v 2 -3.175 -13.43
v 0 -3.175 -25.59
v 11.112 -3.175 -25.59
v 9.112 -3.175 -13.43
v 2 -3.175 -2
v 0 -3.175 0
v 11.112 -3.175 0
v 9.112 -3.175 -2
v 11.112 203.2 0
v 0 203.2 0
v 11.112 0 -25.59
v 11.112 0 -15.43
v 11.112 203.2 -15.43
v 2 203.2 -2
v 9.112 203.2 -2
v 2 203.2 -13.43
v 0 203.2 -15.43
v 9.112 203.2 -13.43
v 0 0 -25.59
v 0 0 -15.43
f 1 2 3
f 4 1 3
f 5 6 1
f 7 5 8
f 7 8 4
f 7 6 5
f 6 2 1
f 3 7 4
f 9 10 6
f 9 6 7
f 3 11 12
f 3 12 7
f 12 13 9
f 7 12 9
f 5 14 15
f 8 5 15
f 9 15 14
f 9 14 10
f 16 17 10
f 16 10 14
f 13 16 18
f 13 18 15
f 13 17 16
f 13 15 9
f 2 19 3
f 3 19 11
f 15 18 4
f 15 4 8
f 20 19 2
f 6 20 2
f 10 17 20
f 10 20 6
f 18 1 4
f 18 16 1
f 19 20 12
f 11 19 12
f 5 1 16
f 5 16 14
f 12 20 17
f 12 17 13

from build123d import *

# Parameters (mm, degrees)
SKETCH1_W           = 11.112
SKETCH1_H           = 15.43
SKETCH1_W_2         = 7.112
SKETCH1_H_2         = 11.43
BOSS_EXTRUDE1_DEPTH = 203.2
SKETCH2_W           = 11.112
SKETCH2_H           = 25.59
SKETCH2_W_2         = 7.112
SKETCH2_H_2         = 11.43
BOSS_EXTRUDE2_DEPTH = 3.175


with BuildPart() as part:
    # Sketch1 → Boss-Extrude1 (new body)
    with BuildSketch(Plane(origin=(0, 0, 0), x_dir=(1, 0, 0), z_dir=(0, 1, 0))):
        with Locations((5.556, 7.715)):
            Rectangle(SKETCH1_W, SKETCH1_H)
        with Locations((5.556, 7.715)):
            Rectangle(SKETCH1_W_2, SKETCH1_H_2, mode=Mode.SUBTRACT)
    extrude(amount=BOSS_EXTRUDE1_DEPTH)

    # Sketch2 → Boss-Extrude2 (add)
    with BuildSketch(Plane.XZ):
        with Locations((5.556, -12.795)):
            Rectangle(SKETCH2_W, SKETCH2_H)
        with Locations((5.556, -7.715)):
            Rectangle(SKETCH2_W_2, SKETCH2_H_2, mode=Mode.SUBTRACT)
    extrude(amount=BOSS_EXTRUDE2_DEPTH)


solid = part.part
